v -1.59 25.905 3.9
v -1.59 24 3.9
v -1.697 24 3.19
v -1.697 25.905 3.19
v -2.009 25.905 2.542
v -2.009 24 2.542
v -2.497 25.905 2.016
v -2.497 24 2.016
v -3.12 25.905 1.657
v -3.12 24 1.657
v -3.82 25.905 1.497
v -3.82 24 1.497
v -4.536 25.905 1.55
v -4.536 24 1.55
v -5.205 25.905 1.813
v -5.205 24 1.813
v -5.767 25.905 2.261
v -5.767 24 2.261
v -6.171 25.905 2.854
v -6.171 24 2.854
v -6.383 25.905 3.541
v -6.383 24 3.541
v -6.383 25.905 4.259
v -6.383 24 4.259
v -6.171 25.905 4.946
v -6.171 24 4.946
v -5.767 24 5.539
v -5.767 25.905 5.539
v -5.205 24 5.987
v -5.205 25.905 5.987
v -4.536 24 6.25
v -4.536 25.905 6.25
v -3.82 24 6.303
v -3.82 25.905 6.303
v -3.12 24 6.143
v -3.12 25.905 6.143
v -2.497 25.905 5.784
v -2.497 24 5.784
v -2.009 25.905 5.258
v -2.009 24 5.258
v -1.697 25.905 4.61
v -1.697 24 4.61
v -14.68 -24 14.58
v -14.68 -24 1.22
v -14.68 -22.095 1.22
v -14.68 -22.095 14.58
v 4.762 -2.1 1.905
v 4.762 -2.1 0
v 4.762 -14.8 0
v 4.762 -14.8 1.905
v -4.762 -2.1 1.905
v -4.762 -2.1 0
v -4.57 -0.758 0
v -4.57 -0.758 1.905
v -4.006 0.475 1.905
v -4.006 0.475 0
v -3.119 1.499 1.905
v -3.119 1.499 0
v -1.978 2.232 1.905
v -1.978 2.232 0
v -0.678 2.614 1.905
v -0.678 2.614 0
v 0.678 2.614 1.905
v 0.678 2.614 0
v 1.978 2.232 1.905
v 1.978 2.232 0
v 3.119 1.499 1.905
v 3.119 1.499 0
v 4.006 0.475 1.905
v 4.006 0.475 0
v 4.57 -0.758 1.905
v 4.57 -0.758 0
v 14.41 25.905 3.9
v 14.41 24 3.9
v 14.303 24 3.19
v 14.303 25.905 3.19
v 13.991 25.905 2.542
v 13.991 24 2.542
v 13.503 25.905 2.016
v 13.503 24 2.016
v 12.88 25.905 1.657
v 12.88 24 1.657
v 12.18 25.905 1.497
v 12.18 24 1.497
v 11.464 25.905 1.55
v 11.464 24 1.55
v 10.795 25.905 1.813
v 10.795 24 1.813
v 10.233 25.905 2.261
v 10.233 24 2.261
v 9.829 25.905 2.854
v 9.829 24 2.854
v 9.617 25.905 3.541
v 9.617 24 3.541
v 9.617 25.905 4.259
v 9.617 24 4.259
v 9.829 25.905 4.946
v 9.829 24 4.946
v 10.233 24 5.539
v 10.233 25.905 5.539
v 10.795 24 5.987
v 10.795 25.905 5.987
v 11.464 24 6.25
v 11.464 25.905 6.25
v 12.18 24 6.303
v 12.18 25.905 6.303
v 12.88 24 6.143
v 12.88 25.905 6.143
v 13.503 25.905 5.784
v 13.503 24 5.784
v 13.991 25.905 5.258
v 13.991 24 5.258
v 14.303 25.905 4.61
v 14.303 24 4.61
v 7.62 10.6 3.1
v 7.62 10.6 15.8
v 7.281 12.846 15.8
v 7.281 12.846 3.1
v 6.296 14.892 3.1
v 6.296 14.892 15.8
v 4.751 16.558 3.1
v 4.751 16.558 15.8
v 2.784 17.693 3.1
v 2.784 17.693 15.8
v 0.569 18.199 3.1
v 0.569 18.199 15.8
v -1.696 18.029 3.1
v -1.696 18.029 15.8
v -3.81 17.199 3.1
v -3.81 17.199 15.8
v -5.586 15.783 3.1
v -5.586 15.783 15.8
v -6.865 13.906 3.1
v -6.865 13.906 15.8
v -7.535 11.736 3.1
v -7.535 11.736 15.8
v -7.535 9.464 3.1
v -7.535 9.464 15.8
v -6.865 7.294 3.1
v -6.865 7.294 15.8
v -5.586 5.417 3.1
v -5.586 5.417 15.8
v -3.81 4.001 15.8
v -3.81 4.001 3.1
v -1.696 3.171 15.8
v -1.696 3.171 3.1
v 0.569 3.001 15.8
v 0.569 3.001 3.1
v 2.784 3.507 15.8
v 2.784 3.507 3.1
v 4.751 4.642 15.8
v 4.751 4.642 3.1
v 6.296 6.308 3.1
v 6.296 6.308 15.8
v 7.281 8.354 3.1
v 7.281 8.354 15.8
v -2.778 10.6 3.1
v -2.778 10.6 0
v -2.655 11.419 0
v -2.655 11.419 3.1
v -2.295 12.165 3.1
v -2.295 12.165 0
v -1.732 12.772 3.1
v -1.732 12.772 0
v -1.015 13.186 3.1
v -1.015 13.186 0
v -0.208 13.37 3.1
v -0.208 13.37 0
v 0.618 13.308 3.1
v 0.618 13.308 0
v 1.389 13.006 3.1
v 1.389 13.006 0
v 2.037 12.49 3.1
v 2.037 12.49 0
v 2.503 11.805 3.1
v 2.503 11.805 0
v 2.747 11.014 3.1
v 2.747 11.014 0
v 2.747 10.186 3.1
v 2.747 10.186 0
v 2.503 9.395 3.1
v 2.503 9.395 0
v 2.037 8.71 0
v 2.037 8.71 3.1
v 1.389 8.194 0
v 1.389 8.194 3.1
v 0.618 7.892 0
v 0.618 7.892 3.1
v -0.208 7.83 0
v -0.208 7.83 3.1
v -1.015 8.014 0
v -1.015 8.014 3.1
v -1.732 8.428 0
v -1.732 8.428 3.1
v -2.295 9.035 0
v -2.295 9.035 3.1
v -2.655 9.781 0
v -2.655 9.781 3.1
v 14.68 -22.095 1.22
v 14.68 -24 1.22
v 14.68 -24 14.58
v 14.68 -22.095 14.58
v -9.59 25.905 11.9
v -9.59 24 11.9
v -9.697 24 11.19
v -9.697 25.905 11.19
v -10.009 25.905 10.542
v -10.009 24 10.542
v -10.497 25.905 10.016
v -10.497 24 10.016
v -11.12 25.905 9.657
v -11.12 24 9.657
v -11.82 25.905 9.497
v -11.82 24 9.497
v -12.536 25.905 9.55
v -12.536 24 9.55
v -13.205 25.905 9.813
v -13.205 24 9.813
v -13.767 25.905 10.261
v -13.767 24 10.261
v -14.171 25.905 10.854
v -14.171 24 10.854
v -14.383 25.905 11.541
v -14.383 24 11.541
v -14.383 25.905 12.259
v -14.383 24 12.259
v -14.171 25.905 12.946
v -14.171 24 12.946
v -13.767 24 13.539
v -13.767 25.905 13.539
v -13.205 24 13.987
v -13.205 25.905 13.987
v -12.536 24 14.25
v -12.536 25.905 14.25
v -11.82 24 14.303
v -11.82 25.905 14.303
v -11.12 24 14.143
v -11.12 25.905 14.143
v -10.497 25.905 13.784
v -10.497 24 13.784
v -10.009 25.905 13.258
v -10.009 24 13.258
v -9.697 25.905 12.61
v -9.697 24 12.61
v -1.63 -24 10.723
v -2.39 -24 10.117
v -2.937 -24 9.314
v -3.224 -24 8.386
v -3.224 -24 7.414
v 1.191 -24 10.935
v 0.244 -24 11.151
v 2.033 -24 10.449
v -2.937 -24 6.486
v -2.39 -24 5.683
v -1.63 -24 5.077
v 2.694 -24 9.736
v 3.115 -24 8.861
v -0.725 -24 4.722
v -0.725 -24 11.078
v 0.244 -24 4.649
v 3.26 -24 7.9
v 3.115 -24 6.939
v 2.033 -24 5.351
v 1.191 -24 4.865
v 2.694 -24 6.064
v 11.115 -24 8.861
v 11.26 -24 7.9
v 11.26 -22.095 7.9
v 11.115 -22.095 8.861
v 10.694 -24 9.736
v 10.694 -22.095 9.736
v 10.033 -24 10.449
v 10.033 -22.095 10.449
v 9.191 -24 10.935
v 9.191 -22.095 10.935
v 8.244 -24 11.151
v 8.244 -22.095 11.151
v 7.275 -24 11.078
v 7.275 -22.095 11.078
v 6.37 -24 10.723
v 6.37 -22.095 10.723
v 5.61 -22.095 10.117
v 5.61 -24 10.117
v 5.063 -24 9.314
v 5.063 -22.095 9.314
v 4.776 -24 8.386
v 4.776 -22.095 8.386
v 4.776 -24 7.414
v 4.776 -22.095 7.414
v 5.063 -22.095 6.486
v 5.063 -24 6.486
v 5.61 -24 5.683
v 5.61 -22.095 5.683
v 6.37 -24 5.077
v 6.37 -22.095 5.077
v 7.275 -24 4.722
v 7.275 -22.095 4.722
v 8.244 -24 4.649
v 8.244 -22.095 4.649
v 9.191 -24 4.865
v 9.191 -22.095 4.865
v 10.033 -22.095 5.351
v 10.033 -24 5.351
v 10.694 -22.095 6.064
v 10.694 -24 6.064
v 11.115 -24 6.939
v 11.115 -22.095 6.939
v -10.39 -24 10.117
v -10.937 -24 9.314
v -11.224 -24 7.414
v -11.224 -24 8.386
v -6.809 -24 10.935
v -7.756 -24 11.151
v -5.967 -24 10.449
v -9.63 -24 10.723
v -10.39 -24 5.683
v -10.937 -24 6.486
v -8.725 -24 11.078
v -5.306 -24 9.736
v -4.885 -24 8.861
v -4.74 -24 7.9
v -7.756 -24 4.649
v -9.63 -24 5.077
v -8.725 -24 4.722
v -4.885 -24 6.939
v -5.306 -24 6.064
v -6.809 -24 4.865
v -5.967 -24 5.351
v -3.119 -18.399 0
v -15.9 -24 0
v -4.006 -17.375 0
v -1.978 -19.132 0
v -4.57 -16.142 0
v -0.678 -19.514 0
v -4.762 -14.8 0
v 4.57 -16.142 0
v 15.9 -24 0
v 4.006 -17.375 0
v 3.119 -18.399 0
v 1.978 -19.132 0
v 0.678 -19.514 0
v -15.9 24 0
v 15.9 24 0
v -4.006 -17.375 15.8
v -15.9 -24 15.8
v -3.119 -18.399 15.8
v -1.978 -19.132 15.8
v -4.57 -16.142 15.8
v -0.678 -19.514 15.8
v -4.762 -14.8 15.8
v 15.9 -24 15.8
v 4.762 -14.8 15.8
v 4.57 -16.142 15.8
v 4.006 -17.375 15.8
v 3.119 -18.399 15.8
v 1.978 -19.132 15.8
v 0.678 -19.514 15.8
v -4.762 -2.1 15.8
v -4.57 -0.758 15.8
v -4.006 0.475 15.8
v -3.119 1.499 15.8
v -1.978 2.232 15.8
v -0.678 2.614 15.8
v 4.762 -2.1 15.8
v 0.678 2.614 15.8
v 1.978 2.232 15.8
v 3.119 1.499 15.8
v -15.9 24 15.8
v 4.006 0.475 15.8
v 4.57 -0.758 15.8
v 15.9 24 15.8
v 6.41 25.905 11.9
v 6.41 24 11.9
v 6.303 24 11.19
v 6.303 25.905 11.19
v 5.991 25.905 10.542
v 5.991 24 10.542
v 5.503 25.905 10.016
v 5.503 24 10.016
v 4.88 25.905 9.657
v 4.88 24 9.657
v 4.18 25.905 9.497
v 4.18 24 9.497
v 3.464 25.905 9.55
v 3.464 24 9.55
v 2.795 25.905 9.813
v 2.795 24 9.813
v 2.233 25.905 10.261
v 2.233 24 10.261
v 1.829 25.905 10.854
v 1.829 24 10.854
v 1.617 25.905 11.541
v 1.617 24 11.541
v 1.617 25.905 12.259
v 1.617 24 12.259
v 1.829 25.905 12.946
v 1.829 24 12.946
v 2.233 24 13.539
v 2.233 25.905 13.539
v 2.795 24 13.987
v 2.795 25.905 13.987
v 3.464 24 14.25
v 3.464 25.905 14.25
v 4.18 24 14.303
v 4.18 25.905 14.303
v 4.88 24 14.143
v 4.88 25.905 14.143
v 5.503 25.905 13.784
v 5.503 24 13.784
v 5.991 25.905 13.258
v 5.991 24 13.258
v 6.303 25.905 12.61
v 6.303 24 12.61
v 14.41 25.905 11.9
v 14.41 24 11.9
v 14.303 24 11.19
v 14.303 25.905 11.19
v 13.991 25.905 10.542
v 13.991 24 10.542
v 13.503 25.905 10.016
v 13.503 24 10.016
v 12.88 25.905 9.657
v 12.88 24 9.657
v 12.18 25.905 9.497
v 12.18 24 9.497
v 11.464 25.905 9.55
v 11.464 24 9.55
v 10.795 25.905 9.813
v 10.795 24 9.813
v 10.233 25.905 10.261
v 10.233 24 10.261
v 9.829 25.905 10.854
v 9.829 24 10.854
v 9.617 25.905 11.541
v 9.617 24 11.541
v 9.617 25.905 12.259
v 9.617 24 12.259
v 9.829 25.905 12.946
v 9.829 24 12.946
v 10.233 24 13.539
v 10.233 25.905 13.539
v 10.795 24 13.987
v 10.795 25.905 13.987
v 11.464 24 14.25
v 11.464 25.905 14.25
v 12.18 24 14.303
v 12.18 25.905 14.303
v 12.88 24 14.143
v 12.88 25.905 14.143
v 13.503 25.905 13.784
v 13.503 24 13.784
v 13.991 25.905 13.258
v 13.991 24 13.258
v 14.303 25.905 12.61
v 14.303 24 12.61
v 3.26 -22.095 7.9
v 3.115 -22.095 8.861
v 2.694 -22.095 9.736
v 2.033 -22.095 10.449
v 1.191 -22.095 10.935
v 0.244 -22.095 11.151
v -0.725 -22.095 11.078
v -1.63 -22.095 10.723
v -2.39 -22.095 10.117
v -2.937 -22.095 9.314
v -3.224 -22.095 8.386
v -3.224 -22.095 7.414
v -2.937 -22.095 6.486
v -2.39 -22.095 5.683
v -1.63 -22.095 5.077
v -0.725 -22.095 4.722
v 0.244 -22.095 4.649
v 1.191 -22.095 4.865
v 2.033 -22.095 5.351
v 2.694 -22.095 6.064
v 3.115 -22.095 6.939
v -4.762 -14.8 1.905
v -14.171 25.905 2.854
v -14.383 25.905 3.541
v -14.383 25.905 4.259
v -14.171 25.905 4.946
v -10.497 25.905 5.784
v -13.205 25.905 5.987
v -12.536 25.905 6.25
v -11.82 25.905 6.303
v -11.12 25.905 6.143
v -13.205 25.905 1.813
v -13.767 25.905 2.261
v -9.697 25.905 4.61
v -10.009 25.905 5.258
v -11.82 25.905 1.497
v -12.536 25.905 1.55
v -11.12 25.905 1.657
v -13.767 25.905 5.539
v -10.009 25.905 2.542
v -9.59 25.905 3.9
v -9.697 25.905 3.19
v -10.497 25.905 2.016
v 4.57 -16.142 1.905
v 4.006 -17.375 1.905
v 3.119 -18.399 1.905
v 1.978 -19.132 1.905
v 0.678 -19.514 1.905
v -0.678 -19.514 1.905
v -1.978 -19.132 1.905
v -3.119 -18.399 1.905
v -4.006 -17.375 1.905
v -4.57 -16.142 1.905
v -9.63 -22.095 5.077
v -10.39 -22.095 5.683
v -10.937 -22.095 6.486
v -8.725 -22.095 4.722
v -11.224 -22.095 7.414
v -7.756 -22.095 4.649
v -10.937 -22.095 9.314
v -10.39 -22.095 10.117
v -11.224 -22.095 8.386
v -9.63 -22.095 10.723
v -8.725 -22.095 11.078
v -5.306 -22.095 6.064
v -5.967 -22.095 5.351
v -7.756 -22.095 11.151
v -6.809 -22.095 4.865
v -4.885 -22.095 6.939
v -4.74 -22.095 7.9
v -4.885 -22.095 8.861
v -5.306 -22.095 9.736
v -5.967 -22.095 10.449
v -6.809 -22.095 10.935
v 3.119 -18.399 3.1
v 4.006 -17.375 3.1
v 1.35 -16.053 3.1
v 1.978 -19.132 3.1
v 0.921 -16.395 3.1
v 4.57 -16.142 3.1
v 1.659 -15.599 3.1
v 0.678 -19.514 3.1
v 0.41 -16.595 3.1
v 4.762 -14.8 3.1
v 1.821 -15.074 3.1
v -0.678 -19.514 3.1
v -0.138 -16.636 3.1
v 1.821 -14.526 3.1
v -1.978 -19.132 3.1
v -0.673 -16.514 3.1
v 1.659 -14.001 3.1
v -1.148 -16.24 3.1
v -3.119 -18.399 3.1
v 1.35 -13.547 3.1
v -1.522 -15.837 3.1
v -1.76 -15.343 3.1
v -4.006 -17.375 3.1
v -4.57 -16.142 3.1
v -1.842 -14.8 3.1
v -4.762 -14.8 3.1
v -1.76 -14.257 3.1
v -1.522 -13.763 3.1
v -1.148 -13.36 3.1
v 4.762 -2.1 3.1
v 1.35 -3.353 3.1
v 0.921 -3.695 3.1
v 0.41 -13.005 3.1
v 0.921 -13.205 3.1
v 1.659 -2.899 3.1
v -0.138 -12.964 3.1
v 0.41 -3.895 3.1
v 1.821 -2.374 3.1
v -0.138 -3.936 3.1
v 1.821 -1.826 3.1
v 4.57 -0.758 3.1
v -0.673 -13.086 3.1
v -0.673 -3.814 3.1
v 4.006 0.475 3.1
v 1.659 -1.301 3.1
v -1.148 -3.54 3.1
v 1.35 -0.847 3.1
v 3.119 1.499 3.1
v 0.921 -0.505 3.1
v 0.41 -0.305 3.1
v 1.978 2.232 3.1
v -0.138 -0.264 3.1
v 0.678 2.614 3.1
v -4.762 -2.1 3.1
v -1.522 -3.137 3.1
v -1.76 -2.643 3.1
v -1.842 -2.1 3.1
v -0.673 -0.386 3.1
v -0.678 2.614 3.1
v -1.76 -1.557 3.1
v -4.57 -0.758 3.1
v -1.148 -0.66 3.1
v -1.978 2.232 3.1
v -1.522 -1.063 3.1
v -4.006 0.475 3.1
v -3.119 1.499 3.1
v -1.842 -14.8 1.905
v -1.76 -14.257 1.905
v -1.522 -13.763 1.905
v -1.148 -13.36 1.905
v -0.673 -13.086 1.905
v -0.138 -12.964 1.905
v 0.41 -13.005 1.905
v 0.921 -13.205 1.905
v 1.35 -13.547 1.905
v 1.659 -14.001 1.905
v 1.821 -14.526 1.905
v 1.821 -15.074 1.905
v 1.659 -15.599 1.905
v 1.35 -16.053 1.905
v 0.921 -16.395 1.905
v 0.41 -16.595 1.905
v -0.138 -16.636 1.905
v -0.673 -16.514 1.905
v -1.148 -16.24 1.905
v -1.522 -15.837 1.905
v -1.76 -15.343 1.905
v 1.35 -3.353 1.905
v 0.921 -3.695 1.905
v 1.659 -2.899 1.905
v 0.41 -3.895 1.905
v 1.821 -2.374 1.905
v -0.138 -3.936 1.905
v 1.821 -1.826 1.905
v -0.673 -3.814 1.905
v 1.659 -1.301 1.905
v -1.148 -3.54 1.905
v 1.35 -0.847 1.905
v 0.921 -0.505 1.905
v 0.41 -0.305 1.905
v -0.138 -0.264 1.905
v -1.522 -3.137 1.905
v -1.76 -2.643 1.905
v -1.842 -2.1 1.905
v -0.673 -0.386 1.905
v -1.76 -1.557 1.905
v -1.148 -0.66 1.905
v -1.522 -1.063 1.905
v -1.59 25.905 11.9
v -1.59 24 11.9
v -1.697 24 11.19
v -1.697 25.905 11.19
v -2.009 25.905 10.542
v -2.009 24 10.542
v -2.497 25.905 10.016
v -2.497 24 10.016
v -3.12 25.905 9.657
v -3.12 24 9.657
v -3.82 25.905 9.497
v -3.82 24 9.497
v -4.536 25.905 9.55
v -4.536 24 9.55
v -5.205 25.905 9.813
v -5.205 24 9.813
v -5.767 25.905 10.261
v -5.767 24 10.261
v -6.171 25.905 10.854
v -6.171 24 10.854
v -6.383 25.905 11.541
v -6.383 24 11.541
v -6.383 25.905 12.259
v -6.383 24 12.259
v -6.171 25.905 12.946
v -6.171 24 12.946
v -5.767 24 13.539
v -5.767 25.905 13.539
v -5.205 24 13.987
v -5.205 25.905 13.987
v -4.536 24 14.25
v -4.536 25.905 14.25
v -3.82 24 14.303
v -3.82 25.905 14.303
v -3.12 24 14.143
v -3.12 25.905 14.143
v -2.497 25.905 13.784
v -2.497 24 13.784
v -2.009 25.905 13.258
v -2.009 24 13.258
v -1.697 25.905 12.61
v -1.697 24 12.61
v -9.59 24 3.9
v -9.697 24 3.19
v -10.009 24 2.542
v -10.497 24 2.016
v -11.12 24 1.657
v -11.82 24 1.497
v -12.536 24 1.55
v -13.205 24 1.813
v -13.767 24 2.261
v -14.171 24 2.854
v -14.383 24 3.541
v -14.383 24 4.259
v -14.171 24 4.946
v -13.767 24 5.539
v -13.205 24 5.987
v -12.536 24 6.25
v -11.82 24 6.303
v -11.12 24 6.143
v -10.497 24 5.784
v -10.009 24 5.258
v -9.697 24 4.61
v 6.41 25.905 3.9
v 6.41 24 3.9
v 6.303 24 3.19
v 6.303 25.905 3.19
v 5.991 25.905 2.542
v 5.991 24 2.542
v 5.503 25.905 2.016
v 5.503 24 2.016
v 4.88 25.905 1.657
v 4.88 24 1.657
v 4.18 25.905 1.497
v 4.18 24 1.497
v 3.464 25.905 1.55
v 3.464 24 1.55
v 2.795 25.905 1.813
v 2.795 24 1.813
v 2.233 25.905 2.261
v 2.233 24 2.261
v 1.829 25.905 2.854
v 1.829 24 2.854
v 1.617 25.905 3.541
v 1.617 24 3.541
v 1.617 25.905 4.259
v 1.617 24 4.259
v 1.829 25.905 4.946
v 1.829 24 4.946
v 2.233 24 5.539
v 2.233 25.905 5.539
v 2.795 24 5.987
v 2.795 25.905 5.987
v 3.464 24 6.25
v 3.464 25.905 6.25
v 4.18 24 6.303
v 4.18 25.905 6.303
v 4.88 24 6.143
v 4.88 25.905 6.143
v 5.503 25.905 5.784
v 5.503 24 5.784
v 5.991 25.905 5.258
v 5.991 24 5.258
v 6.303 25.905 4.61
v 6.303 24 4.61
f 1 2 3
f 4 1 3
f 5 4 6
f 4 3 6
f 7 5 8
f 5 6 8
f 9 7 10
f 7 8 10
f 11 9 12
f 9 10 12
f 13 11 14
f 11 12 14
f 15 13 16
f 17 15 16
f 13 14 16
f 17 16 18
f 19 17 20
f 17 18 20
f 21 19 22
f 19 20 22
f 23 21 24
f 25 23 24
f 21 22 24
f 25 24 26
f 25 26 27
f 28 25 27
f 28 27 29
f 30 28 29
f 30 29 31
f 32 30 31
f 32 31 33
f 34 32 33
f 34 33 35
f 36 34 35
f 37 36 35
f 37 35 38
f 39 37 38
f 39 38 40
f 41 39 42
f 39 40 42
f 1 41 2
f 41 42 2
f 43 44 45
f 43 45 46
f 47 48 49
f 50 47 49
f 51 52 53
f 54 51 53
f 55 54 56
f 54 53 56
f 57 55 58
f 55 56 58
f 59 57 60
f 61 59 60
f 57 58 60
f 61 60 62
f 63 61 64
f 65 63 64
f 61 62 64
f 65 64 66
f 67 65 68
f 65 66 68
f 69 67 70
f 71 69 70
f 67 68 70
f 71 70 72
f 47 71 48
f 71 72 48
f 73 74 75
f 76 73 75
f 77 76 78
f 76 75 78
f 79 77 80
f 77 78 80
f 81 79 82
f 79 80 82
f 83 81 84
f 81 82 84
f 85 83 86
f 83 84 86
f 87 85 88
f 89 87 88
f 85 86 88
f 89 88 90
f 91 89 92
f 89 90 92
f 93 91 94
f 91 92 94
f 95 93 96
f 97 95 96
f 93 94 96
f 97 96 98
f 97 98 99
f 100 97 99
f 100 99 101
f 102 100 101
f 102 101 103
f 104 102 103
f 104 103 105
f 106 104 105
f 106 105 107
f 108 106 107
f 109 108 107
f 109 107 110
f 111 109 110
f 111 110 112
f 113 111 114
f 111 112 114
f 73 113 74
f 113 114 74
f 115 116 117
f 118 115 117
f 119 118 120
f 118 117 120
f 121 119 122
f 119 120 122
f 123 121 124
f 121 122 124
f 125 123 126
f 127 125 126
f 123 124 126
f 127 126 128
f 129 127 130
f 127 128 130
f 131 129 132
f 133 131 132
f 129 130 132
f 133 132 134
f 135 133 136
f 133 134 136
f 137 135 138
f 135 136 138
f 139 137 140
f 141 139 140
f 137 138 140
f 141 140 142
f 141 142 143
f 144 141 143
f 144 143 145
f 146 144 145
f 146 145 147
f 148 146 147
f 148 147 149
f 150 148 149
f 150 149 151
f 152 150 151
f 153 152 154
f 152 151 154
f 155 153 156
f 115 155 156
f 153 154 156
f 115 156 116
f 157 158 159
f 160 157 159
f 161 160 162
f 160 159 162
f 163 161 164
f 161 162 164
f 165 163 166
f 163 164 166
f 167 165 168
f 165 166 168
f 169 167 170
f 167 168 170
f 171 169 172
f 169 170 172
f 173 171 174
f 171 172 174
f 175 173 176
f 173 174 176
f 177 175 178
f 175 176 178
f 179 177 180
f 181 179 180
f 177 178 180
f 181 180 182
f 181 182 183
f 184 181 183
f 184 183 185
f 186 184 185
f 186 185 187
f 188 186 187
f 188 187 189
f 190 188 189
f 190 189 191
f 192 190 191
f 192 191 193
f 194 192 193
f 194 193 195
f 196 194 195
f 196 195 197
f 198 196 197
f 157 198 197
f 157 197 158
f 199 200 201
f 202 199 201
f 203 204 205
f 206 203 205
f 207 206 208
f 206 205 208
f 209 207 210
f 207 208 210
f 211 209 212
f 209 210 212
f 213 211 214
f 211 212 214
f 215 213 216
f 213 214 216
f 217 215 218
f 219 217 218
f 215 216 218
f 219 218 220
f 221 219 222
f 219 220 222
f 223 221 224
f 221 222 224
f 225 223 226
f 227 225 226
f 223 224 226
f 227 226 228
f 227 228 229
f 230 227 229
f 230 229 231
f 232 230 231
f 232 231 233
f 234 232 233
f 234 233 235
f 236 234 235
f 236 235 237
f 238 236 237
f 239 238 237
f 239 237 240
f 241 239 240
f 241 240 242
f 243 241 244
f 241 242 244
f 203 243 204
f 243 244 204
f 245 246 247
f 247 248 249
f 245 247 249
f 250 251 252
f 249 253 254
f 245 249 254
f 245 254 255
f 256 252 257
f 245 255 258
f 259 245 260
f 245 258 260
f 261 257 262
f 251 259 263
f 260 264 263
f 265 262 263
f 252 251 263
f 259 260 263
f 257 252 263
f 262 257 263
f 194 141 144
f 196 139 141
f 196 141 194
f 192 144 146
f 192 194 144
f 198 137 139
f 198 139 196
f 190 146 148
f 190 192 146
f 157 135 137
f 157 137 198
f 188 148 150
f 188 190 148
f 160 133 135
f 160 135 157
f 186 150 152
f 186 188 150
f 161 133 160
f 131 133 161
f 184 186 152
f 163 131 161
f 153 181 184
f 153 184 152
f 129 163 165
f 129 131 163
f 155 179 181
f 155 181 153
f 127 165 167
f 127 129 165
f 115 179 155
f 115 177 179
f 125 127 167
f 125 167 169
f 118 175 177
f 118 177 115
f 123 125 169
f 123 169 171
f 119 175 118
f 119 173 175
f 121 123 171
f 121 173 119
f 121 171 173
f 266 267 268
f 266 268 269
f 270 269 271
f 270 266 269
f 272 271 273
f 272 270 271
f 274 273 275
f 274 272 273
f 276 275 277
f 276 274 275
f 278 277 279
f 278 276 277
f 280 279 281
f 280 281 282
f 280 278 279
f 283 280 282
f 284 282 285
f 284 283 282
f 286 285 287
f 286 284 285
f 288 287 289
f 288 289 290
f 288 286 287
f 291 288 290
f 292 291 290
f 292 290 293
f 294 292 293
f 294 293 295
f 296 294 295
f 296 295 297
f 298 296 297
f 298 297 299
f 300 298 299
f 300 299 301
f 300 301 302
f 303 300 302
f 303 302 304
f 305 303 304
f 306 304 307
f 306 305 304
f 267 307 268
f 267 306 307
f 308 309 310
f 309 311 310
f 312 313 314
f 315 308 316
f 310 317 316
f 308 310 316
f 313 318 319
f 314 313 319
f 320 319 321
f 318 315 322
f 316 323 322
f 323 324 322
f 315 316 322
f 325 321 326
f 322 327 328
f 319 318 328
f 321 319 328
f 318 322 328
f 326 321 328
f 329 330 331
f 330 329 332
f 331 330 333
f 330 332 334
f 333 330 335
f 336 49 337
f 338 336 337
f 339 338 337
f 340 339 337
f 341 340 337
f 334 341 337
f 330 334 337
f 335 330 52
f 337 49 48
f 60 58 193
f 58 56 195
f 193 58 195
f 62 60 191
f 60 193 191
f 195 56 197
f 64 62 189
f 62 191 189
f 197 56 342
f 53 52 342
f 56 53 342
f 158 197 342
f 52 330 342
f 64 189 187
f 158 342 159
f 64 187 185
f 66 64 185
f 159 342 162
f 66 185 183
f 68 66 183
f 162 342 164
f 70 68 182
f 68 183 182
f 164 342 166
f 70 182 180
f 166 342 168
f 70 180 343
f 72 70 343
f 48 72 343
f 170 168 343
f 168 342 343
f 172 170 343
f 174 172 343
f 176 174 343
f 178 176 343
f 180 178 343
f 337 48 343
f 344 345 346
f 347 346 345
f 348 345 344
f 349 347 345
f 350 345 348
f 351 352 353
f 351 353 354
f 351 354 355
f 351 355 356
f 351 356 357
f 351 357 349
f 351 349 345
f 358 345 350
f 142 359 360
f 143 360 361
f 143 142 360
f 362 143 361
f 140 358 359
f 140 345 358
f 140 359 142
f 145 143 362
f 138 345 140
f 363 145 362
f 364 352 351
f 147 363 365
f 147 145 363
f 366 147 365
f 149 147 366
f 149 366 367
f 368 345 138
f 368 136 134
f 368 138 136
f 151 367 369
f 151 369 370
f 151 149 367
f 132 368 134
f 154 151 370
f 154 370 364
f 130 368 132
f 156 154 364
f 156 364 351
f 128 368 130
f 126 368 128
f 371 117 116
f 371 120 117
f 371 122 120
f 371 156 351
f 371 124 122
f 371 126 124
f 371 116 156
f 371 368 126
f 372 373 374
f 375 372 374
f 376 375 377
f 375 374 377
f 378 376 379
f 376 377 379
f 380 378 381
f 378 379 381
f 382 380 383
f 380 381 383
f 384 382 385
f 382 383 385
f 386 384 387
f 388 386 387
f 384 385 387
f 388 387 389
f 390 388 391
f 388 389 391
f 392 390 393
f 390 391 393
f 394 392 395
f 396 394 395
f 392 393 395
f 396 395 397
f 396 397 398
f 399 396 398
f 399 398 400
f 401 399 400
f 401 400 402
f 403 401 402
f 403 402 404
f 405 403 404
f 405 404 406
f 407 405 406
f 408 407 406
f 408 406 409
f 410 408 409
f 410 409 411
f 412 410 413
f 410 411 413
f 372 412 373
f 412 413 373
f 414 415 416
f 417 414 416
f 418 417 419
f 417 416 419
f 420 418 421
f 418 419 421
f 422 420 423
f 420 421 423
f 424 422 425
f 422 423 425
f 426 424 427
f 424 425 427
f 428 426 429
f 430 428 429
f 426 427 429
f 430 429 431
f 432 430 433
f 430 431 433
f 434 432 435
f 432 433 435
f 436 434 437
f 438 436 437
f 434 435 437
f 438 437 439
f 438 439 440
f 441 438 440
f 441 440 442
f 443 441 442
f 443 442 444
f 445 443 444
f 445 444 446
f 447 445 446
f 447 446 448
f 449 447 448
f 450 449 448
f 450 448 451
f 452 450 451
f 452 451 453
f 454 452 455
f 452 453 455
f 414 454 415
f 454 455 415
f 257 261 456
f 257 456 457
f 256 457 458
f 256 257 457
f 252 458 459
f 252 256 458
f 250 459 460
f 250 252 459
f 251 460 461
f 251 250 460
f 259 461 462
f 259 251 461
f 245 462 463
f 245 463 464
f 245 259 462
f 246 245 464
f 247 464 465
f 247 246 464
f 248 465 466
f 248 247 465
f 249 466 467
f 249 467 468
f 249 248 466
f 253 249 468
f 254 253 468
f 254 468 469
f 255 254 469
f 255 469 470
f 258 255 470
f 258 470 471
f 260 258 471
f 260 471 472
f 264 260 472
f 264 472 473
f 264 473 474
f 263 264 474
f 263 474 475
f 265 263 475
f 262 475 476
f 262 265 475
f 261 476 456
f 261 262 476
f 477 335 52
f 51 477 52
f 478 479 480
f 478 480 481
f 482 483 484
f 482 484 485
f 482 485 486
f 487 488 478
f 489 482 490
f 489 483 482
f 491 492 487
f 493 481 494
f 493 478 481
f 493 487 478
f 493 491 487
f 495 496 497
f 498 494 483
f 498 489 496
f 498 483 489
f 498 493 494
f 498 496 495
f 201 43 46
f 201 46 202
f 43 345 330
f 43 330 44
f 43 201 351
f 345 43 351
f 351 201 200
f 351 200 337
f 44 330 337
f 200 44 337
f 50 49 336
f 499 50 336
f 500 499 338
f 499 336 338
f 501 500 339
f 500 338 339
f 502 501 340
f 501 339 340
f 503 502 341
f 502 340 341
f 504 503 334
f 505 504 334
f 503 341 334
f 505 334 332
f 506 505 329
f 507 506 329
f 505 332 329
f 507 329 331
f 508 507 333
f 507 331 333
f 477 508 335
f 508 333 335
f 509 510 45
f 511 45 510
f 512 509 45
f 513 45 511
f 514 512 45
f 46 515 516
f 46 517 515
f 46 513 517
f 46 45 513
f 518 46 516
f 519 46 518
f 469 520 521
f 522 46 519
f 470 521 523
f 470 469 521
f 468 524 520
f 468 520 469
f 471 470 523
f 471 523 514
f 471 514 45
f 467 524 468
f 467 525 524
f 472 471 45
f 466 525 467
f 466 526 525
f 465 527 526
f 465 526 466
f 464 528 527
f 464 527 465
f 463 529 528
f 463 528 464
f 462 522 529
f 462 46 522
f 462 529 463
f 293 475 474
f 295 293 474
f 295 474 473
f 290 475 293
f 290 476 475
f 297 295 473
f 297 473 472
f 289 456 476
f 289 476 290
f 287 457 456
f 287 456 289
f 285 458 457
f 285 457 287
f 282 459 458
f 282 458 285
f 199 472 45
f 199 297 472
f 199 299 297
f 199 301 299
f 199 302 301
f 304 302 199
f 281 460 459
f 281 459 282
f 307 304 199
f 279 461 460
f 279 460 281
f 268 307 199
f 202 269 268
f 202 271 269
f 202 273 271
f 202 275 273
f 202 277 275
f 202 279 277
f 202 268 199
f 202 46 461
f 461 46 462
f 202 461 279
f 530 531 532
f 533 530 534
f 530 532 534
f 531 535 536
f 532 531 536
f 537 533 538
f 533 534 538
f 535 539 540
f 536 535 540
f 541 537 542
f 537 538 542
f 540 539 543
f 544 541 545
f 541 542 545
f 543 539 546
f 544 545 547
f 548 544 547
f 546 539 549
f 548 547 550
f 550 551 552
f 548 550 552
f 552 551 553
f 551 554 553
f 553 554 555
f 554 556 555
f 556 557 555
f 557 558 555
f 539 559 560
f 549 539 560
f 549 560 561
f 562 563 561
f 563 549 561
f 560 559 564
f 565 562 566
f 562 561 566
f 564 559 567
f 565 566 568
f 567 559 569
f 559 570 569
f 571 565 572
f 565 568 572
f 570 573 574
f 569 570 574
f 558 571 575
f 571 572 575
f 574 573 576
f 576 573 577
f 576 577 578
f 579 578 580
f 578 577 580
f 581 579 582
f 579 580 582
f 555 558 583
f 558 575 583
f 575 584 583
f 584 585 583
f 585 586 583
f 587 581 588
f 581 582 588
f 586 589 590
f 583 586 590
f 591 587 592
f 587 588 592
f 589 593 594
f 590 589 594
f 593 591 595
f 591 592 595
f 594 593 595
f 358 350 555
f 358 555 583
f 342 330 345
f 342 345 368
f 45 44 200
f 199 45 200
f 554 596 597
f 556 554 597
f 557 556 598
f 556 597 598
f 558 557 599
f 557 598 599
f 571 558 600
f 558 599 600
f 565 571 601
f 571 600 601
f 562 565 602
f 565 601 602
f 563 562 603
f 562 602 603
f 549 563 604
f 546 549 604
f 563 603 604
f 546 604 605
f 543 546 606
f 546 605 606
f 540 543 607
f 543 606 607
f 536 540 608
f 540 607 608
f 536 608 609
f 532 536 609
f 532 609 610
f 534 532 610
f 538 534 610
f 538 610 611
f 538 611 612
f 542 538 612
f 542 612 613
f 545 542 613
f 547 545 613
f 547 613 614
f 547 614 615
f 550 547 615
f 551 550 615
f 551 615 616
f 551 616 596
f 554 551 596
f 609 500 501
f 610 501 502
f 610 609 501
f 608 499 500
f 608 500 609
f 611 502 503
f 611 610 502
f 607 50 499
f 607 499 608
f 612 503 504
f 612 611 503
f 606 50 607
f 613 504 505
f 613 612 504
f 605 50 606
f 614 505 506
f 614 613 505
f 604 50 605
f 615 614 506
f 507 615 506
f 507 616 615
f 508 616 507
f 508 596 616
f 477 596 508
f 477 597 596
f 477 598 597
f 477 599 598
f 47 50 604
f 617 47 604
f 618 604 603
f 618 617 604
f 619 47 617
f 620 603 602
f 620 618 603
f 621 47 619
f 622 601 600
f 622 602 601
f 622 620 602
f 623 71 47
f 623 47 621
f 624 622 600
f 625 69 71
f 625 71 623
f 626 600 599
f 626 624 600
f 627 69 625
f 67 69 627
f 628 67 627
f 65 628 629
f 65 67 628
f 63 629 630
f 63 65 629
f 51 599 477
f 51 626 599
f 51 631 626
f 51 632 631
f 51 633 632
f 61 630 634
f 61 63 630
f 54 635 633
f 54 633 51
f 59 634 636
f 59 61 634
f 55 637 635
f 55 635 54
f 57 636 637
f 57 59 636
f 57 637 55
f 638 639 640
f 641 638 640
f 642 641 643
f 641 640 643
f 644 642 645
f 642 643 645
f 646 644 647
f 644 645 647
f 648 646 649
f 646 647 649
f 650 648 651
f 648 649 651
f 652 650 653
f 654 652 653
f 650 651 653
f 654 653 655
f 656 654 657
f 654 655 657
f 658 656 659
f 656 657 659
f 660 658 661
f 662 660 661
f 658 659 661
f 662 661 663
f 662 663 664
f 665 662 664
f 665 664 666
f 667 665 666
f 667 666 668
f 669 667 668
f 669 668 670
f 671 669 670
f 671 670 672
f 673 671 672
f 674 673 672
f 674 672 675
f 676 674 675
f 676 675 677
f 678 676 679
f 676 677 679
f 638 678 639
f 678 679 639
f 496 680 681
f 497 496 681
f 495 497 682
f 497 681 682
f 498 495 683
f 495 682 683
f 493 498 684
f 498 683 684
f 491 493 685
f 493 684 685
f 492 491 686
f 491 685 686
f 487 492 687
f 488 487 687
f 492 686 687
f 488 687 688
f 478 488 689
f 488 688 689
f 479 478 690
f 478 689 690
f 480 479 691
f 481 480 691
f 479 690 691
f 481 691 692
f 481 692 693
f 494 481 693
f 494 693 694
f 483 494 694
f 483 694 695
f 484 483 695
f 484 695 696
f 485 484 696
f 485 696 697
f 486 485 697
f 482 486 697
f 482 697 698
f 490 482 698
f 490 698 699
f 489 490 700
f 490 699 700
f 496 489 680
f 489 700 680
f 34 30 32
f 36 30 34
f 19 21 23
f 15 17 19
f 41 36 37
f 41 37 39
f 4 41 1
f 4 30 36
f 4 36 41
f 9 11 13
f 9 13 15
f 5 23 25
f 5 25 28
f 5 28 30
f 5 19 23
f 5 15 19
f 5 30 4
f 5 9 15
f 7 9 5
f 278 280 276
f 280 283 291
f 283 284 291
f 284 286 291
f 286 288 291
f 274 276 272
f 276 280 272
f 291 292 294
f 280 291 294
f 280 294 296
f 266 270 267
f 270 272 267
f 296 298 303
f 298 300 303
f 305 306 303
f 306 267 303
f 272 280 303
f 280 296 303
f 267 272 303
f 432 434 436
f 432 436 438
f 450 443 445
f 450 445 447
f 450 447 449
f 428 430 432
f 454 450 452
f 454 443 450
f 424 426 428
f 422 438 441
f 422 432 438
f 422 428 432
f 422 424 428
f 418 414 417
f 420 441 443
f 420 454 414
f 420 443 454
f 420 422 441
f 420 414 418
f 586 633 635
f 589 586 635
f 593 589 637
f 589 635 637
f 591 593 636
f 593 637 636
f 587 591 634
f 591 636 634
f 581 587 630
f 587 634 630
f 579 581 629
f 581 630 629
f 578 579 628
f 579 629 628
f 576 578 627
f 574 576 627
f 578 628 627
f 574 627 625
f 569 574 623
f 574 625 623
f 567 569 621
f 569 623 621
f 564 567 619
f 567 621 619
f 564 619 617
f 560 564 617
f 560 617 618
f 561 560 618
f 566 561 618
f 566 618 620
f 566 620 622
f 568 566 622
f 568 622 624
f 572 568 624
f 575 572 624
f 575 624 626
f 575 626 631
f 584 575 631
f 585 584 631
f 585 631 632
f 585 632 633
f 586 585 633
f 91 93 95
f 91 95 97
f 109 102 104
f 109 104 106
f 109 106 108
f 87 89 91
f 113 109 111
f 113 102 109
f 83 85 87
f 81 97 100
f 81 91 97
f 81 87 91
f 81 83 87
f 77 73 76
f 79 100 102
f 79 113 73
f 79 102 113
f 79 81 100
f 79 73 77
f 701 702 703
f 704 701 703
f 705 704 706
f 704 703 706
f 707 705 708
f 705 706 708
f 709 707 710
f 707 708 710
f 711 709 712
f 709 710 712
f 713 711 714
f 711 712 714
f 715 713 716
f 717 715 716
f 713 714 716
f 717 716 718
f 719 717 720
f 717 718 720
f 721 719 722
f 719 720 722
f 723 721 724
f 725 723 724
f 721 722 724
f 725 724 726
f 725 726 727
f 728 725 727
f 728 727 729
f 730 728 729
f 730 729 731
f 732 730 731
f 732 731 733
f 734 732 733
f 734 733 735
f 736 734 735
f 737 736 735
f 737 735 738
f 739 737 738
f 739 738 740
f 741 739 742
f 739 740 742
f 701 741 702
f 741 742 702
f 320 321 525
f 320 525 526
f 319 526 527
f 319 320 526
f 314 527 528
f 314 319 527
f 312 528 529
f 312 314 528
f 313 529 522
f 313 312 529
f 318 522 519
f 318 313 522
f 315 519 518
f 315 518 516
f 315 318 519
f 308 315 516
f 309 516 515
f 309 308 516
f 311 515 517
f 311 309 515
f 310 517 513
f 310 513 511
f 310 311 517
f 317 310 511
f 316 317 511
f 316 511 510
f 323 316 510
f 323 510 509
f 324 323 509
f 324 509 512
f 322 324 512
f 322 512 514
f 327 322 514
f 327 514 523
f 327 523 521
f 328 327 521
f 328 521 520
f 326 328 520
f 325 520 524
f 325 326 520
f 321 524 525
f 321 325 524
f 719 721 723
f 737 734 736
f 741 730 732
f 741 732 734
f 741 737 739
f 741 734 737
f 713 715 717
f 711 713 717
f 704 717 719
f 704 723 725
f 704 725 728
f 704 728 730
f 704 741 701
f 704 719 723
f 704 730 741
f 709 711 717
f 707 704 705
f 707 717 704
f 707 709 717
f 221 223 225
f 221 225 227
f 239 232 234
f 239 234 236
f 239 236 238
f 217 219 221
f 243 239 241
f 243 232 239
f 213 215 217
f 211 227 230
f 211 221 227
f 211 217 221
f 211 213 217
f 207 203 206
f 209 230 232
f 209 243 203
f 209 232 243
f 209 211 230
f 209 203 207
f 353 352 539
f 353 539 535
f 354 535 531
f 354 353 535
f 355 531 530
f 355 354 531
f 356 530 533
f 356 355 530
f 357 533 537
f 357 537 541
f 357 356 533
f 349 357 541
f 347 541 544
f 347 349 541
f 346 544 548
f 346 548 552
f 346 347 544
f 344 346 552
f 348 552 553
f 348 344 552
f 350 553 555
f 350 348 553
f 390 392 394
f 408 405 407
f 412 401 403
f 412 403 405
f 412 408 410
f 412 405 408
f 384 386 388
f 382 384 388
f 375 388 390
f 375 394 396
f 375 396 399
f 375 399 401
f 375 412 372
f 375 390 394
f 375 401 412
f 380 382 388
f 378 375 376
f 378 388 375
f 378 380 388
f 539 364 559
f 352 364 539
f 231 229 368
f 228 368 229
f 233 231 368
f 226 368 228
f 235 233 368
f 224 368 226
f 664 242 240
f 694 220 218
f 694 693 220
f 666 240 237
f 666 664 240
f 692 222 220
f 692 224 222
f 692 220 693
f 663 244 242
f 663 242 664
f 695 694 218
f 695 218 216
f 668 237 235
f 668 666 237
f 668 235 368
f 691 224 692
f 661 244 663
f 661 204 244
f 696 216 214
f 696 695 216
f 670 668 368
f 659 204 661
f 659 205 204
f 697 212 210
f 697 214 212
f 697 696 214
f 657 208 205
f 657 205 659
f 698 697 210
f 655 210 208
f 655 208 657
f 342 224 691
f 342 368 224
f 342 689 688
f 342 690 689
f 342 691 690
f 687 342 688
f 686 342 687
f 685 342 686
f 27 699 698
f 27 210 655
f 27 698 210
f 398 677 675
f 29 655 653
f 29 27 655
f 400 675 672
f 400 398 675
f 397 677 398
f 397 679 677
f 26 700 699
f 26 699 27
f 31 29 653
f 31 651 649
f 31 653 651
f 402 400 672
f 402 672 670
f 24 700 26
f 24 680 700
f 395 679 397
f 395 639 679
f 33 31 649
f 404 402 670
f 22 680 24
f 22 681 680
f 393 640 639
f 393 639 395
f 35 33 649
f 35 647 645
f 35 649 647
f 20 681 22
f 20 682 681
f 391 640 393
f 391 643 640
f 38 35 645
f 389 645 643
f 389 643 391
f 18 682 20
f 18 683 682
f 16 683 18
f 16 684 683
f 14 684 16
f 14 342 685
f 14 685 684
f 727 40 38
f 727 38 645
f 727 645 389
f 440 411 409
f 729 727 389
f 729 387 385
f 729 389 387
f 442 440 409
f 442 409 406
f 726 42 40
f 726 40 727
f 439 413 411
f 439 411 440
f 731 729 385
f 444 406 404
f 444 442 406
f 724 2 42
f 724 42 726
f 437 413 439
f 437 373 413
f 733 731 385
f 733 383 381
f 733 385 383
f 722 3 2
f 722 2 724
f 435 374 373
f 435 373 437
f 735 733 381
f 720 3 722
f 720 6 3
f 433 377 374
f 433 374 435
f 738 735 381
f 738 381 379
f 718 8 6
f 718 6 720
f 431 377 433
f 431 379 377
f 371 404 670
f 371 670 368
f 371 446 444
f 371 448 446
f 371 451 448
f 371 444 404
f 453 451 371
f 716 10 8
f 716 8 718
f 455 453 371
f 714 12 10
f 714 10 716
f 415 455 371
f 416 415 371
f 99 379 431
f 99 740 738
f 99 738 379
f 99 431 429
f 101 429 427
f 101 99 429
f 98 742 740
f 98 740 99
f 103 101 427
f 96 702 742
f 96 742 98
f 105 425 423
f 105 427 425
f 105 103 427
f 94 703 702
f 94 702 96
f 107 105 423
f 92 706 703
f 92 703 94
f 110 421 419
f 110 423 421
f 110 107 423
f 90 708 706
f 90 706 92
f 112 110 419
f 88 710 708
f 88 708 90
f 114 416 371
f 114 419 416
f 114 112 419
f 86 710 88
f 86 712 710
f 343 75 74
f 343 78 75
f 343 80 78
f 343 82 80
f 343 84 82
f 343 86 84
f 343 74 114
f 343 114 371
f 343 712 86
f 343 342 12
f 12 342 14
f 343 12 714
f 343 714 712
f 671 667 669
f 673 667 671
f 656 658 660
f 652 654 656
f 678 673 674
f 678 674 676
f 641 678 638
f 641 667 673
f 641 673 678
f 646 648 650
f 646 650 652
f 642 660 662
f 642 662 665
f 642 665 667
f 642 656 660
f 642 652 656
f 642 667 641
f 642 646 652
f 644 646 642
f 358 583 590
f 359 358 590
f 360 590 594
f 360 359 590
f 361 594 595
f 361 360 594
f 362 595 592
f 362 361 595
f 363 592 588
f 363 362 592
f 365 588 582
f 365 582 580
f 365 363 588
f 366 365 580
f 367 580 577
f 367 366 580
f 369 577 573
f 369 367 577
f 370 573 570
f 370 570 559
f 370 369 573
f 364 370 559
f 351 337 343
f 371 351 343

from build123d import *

# Parameters (mm, degrees)
SKETCH1_W           = 31.8
SKETCH1_H           = 48
BOSS_EXTRUDE1_DEPTH = 15.8
SKETCH2_R           = 7.62
CUT_EXTRUDE1_DEPTH  = 12.7
SKETCH3_R           = 2.77815
SKETCH3_R_2         = 1.8415
CUT_EXTRUDE2_DEPTH  = 12.7
CUT_EXTRUDE3_DEPTH  = 1.905
SKETCH5_R           = 2.41
BOSS_EXTRUDE2_DEPTH = 1.905
SKETCH6_W           = 29.36
SKETCH6_H           = 13.36
SKETCH6_R           = 3.26
CUT_EXTRUDE4_DEPTH  = 1.905


with BuildPart() as part:
    # Sketch1 → Boss-Extrude1 (new body)
    with BuildSketch(Plane.XY):
        Rectangle(SKETCH1_W, SKETCH1_H)
    extrude(amount=BOSS_EXTRUDE1_DEPTH)

    # Sketch2 → Cut-Extrude1 (cut)
    with BuildSketch(Plane.XY.offset(15.8)):
        with Locations((0, 10.6)):
            Circle(SKETCH2_R)
        with BuildLine():
            Line((4.7625, -2.1), (4.7625, -14.8))
            ThreePointArc((4.7625, -14.8), (0, -19.5625), (-4.7625, -14.8))
            Line((-4.7625, -14.8), (-4.7625, -2.1))
            ThreePointArc((-4.7625, -2.1), (0, 2.6625), (4.7625, -2.1))
        make_face()
    extrude(amount=-CUT_EXTRUDE1_DEPTH, mode=Mode.SUBTRACT)

    # Sketch3 → Cut-Extrude2 (cut)
    with BuildSketch(Plane(origin=(0, 0, 0), x_dir=(-1, 0, 0), z_dir=(0, 0, -1))):
        with Locations((0, 10.6)):
            Circle(SKETCH3_R)
        with Locations((0, -2.1)):
            Circle(SKETCH3_R_2)
        with Locations((0, -14.8)):
            Circle(SKETCH3_R_2)
    extrude(amount=-CUT_EXTRUDE2_DEPTH, mode=Mode.SUBTRACT)

    # Sketch4 → Cut-Extrude3 (cut)
    with BuildSketch(Plane(origin=(0, 0, 0), x_dir=(-1, 0, 0), z_dir=(0, 0, -1))):
        with BuildLine():
            Line((4.7625, -14.8), (4.7625, -2.1))
            ThreePointArc((4.7625, -2.1), (0, 2.6625), (-4.7625, -2.1))
            Line((-4.7625, -2.1), (-4.7625, -14.8))
            ThreePointArc((-4.7625, -14.8), (0, -19.5625), (4.7625, -14.8))
        make_face()
    extrude(amount=-CUT_EXTRUDE3_DEPTH, mode=Mode.SUBTRACT)

    # Sketch5 → Boss-Extrude2 (add)
    with BuildSketch(Plane(origin=(0, 24, 0), x_dir=(1, 0, 0), z_dir=(0, 1, 0))):
        with Locations((-12, -3.9)):
            Circle(SKETCH5_R)
        with Locations((-12, -11.9)):
            Circle(SKETCH5_R)
        with Locations((-4, -3.9)):
            Circle(SKETCH5_R)
        with Locations((-4, -11.9)):
            Circle(SKETCH5_R)
        with Locations((4, -3.9)):
            Circle(SKETCH5_R)
        with Locations((4, -11.9)):
            Circle(SKETCH5_R)
        with Locations((12, -3.9)):
            Circle(SKETCH5_R)
        with Locations((12, -11.9)):
            Circle(SKETCH5_R)
    extrude(amount=BOSS_EXTRUDE2_DEPTH)

    # Sketch6 → Cut-Extrude4 (cut)
    with BuildSketch(Plane.XZ.offset(24)):
        with Locations((0, 7.9)):
            Rectangle(SKETCH6_W, SKETCH6_H)
        with Locations((-8, 7.9)):
            Circle(SKETCH6_R, mode=Mode.SUBTRACT)
        with Locations((0, 7.9)):
            Circle(SKETCH6_R, mode=Mode.SUBTRACT)
        with Locations((8, 7.9)):
            Circle(SKETCH6_R, mode=Mode.SUBTRACT)
    extrude(amount=-CUT_EXTRUDE4_DEPTH, mode=Mode.SUBTRACT)


solid = part.part
